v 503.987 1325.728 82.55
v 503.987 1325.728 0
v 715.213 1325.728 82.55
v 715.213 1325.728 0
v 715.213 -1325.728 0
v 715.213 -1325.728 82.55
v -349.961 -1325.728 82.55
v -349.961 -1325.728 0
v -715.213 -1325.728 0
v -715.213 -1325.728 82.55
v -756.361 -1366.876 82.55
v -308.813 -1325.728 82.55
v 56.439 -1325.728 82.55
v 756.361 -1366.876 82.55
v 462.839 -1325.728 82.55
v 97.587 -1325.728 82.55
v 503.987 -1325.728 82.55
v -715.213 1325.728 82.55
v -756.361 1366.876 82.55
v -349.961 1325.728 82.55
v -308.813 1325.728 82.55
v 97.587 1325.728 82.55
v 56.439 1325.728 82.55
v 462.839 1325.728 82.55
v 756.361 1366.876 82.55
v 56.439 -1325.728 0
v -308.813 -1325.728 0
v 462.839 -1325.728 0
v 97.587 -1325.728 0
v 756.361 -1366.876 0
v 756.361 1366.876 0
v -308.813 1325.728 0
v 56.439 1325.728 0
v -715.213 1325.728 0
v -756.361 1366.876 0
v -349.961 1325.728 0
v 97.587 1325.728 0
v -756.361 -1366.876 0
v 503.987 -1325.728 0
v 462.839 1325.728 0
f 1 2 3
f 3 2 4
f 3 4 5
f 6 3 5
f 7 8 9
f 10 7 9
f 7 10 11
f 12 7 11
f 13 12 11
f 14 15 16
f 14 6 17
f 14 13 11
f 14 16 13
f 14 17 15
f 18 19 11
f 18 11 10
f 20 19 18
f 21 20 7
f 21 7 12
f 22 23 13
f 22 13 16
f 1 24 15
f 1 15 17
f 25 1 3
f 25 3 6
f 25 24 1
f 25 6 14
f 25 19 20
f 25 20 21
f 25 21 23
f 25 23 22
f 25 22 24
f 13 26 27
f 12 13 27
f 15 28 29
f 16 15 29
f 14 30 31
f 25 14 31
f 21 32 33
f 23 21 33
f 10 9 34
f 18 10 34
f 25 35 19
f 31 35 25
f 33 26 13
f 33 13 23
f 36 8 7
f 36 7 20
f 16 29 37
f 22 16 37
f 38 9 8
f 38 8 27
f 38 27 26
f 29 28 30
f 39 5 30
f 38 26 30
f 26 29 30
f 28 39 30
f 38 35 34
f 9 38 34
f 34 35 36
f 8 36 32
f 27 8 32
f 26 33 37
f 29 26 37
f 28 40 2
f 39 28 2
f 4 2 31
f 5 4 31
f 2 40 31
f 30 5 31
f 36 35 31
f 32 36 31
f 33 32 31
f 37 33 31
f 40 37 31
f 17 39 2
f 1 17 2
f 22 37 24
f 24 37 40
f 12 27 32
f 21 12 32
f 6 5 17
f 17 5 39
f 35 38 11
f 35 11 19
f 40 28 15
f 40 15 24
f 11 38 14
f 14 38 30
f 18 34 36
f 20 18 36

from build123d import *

# Parameters (mm, degrees)
F0_W     = 1512.7224
F0_H     = 2733.7512
F0_W_2   = 41.148
F0_H_2   = 2651.4552
F1_DEPTH = 82.55


# Not quite as in the source:
# - a feature names something its author has since deleted; it is built from what else it names


with BuildPart() as f1:
    # F0 (on Top) → F1 (new body)
    with BuildSketch(Plane.XY):
        Rectangle(F0_W, F0_H)
        Polygon((715.2132, 1325.7276), (715.2132, -1325.7276), (503.9868, -1325.7276), (462.8388, -1325.7276), (97.5868, -1325.7276), (56.4388, -1325.7276), (-308.8132, -1325.7276), (-349.9612, -1325.7276), (-715.2132, -1325.7276), (-715.2132, 1325.7276), (-349.9612, 1325.7276), (-308.8132, 1325.7276), (56.4388, 1325.7276), (97.5868, 1325.7276), (462.8388, 1325.7276), (503.9868, 1325.7276), align=None, mode=Mode.SUBTRACT)
        with Locations((483.4128, 0)):
            Rectangle(F0_W_2, F0_H_2)
        with Locations((77.0128, 0)):
            Rectangle(F0_W_2, F0_H_2)
        with Locations((-329.3872, 0)):
            Rectangle(F0_W_2, F0_H_2)
    extrude(amount=F1_DEPTH)


solid = f1.part
